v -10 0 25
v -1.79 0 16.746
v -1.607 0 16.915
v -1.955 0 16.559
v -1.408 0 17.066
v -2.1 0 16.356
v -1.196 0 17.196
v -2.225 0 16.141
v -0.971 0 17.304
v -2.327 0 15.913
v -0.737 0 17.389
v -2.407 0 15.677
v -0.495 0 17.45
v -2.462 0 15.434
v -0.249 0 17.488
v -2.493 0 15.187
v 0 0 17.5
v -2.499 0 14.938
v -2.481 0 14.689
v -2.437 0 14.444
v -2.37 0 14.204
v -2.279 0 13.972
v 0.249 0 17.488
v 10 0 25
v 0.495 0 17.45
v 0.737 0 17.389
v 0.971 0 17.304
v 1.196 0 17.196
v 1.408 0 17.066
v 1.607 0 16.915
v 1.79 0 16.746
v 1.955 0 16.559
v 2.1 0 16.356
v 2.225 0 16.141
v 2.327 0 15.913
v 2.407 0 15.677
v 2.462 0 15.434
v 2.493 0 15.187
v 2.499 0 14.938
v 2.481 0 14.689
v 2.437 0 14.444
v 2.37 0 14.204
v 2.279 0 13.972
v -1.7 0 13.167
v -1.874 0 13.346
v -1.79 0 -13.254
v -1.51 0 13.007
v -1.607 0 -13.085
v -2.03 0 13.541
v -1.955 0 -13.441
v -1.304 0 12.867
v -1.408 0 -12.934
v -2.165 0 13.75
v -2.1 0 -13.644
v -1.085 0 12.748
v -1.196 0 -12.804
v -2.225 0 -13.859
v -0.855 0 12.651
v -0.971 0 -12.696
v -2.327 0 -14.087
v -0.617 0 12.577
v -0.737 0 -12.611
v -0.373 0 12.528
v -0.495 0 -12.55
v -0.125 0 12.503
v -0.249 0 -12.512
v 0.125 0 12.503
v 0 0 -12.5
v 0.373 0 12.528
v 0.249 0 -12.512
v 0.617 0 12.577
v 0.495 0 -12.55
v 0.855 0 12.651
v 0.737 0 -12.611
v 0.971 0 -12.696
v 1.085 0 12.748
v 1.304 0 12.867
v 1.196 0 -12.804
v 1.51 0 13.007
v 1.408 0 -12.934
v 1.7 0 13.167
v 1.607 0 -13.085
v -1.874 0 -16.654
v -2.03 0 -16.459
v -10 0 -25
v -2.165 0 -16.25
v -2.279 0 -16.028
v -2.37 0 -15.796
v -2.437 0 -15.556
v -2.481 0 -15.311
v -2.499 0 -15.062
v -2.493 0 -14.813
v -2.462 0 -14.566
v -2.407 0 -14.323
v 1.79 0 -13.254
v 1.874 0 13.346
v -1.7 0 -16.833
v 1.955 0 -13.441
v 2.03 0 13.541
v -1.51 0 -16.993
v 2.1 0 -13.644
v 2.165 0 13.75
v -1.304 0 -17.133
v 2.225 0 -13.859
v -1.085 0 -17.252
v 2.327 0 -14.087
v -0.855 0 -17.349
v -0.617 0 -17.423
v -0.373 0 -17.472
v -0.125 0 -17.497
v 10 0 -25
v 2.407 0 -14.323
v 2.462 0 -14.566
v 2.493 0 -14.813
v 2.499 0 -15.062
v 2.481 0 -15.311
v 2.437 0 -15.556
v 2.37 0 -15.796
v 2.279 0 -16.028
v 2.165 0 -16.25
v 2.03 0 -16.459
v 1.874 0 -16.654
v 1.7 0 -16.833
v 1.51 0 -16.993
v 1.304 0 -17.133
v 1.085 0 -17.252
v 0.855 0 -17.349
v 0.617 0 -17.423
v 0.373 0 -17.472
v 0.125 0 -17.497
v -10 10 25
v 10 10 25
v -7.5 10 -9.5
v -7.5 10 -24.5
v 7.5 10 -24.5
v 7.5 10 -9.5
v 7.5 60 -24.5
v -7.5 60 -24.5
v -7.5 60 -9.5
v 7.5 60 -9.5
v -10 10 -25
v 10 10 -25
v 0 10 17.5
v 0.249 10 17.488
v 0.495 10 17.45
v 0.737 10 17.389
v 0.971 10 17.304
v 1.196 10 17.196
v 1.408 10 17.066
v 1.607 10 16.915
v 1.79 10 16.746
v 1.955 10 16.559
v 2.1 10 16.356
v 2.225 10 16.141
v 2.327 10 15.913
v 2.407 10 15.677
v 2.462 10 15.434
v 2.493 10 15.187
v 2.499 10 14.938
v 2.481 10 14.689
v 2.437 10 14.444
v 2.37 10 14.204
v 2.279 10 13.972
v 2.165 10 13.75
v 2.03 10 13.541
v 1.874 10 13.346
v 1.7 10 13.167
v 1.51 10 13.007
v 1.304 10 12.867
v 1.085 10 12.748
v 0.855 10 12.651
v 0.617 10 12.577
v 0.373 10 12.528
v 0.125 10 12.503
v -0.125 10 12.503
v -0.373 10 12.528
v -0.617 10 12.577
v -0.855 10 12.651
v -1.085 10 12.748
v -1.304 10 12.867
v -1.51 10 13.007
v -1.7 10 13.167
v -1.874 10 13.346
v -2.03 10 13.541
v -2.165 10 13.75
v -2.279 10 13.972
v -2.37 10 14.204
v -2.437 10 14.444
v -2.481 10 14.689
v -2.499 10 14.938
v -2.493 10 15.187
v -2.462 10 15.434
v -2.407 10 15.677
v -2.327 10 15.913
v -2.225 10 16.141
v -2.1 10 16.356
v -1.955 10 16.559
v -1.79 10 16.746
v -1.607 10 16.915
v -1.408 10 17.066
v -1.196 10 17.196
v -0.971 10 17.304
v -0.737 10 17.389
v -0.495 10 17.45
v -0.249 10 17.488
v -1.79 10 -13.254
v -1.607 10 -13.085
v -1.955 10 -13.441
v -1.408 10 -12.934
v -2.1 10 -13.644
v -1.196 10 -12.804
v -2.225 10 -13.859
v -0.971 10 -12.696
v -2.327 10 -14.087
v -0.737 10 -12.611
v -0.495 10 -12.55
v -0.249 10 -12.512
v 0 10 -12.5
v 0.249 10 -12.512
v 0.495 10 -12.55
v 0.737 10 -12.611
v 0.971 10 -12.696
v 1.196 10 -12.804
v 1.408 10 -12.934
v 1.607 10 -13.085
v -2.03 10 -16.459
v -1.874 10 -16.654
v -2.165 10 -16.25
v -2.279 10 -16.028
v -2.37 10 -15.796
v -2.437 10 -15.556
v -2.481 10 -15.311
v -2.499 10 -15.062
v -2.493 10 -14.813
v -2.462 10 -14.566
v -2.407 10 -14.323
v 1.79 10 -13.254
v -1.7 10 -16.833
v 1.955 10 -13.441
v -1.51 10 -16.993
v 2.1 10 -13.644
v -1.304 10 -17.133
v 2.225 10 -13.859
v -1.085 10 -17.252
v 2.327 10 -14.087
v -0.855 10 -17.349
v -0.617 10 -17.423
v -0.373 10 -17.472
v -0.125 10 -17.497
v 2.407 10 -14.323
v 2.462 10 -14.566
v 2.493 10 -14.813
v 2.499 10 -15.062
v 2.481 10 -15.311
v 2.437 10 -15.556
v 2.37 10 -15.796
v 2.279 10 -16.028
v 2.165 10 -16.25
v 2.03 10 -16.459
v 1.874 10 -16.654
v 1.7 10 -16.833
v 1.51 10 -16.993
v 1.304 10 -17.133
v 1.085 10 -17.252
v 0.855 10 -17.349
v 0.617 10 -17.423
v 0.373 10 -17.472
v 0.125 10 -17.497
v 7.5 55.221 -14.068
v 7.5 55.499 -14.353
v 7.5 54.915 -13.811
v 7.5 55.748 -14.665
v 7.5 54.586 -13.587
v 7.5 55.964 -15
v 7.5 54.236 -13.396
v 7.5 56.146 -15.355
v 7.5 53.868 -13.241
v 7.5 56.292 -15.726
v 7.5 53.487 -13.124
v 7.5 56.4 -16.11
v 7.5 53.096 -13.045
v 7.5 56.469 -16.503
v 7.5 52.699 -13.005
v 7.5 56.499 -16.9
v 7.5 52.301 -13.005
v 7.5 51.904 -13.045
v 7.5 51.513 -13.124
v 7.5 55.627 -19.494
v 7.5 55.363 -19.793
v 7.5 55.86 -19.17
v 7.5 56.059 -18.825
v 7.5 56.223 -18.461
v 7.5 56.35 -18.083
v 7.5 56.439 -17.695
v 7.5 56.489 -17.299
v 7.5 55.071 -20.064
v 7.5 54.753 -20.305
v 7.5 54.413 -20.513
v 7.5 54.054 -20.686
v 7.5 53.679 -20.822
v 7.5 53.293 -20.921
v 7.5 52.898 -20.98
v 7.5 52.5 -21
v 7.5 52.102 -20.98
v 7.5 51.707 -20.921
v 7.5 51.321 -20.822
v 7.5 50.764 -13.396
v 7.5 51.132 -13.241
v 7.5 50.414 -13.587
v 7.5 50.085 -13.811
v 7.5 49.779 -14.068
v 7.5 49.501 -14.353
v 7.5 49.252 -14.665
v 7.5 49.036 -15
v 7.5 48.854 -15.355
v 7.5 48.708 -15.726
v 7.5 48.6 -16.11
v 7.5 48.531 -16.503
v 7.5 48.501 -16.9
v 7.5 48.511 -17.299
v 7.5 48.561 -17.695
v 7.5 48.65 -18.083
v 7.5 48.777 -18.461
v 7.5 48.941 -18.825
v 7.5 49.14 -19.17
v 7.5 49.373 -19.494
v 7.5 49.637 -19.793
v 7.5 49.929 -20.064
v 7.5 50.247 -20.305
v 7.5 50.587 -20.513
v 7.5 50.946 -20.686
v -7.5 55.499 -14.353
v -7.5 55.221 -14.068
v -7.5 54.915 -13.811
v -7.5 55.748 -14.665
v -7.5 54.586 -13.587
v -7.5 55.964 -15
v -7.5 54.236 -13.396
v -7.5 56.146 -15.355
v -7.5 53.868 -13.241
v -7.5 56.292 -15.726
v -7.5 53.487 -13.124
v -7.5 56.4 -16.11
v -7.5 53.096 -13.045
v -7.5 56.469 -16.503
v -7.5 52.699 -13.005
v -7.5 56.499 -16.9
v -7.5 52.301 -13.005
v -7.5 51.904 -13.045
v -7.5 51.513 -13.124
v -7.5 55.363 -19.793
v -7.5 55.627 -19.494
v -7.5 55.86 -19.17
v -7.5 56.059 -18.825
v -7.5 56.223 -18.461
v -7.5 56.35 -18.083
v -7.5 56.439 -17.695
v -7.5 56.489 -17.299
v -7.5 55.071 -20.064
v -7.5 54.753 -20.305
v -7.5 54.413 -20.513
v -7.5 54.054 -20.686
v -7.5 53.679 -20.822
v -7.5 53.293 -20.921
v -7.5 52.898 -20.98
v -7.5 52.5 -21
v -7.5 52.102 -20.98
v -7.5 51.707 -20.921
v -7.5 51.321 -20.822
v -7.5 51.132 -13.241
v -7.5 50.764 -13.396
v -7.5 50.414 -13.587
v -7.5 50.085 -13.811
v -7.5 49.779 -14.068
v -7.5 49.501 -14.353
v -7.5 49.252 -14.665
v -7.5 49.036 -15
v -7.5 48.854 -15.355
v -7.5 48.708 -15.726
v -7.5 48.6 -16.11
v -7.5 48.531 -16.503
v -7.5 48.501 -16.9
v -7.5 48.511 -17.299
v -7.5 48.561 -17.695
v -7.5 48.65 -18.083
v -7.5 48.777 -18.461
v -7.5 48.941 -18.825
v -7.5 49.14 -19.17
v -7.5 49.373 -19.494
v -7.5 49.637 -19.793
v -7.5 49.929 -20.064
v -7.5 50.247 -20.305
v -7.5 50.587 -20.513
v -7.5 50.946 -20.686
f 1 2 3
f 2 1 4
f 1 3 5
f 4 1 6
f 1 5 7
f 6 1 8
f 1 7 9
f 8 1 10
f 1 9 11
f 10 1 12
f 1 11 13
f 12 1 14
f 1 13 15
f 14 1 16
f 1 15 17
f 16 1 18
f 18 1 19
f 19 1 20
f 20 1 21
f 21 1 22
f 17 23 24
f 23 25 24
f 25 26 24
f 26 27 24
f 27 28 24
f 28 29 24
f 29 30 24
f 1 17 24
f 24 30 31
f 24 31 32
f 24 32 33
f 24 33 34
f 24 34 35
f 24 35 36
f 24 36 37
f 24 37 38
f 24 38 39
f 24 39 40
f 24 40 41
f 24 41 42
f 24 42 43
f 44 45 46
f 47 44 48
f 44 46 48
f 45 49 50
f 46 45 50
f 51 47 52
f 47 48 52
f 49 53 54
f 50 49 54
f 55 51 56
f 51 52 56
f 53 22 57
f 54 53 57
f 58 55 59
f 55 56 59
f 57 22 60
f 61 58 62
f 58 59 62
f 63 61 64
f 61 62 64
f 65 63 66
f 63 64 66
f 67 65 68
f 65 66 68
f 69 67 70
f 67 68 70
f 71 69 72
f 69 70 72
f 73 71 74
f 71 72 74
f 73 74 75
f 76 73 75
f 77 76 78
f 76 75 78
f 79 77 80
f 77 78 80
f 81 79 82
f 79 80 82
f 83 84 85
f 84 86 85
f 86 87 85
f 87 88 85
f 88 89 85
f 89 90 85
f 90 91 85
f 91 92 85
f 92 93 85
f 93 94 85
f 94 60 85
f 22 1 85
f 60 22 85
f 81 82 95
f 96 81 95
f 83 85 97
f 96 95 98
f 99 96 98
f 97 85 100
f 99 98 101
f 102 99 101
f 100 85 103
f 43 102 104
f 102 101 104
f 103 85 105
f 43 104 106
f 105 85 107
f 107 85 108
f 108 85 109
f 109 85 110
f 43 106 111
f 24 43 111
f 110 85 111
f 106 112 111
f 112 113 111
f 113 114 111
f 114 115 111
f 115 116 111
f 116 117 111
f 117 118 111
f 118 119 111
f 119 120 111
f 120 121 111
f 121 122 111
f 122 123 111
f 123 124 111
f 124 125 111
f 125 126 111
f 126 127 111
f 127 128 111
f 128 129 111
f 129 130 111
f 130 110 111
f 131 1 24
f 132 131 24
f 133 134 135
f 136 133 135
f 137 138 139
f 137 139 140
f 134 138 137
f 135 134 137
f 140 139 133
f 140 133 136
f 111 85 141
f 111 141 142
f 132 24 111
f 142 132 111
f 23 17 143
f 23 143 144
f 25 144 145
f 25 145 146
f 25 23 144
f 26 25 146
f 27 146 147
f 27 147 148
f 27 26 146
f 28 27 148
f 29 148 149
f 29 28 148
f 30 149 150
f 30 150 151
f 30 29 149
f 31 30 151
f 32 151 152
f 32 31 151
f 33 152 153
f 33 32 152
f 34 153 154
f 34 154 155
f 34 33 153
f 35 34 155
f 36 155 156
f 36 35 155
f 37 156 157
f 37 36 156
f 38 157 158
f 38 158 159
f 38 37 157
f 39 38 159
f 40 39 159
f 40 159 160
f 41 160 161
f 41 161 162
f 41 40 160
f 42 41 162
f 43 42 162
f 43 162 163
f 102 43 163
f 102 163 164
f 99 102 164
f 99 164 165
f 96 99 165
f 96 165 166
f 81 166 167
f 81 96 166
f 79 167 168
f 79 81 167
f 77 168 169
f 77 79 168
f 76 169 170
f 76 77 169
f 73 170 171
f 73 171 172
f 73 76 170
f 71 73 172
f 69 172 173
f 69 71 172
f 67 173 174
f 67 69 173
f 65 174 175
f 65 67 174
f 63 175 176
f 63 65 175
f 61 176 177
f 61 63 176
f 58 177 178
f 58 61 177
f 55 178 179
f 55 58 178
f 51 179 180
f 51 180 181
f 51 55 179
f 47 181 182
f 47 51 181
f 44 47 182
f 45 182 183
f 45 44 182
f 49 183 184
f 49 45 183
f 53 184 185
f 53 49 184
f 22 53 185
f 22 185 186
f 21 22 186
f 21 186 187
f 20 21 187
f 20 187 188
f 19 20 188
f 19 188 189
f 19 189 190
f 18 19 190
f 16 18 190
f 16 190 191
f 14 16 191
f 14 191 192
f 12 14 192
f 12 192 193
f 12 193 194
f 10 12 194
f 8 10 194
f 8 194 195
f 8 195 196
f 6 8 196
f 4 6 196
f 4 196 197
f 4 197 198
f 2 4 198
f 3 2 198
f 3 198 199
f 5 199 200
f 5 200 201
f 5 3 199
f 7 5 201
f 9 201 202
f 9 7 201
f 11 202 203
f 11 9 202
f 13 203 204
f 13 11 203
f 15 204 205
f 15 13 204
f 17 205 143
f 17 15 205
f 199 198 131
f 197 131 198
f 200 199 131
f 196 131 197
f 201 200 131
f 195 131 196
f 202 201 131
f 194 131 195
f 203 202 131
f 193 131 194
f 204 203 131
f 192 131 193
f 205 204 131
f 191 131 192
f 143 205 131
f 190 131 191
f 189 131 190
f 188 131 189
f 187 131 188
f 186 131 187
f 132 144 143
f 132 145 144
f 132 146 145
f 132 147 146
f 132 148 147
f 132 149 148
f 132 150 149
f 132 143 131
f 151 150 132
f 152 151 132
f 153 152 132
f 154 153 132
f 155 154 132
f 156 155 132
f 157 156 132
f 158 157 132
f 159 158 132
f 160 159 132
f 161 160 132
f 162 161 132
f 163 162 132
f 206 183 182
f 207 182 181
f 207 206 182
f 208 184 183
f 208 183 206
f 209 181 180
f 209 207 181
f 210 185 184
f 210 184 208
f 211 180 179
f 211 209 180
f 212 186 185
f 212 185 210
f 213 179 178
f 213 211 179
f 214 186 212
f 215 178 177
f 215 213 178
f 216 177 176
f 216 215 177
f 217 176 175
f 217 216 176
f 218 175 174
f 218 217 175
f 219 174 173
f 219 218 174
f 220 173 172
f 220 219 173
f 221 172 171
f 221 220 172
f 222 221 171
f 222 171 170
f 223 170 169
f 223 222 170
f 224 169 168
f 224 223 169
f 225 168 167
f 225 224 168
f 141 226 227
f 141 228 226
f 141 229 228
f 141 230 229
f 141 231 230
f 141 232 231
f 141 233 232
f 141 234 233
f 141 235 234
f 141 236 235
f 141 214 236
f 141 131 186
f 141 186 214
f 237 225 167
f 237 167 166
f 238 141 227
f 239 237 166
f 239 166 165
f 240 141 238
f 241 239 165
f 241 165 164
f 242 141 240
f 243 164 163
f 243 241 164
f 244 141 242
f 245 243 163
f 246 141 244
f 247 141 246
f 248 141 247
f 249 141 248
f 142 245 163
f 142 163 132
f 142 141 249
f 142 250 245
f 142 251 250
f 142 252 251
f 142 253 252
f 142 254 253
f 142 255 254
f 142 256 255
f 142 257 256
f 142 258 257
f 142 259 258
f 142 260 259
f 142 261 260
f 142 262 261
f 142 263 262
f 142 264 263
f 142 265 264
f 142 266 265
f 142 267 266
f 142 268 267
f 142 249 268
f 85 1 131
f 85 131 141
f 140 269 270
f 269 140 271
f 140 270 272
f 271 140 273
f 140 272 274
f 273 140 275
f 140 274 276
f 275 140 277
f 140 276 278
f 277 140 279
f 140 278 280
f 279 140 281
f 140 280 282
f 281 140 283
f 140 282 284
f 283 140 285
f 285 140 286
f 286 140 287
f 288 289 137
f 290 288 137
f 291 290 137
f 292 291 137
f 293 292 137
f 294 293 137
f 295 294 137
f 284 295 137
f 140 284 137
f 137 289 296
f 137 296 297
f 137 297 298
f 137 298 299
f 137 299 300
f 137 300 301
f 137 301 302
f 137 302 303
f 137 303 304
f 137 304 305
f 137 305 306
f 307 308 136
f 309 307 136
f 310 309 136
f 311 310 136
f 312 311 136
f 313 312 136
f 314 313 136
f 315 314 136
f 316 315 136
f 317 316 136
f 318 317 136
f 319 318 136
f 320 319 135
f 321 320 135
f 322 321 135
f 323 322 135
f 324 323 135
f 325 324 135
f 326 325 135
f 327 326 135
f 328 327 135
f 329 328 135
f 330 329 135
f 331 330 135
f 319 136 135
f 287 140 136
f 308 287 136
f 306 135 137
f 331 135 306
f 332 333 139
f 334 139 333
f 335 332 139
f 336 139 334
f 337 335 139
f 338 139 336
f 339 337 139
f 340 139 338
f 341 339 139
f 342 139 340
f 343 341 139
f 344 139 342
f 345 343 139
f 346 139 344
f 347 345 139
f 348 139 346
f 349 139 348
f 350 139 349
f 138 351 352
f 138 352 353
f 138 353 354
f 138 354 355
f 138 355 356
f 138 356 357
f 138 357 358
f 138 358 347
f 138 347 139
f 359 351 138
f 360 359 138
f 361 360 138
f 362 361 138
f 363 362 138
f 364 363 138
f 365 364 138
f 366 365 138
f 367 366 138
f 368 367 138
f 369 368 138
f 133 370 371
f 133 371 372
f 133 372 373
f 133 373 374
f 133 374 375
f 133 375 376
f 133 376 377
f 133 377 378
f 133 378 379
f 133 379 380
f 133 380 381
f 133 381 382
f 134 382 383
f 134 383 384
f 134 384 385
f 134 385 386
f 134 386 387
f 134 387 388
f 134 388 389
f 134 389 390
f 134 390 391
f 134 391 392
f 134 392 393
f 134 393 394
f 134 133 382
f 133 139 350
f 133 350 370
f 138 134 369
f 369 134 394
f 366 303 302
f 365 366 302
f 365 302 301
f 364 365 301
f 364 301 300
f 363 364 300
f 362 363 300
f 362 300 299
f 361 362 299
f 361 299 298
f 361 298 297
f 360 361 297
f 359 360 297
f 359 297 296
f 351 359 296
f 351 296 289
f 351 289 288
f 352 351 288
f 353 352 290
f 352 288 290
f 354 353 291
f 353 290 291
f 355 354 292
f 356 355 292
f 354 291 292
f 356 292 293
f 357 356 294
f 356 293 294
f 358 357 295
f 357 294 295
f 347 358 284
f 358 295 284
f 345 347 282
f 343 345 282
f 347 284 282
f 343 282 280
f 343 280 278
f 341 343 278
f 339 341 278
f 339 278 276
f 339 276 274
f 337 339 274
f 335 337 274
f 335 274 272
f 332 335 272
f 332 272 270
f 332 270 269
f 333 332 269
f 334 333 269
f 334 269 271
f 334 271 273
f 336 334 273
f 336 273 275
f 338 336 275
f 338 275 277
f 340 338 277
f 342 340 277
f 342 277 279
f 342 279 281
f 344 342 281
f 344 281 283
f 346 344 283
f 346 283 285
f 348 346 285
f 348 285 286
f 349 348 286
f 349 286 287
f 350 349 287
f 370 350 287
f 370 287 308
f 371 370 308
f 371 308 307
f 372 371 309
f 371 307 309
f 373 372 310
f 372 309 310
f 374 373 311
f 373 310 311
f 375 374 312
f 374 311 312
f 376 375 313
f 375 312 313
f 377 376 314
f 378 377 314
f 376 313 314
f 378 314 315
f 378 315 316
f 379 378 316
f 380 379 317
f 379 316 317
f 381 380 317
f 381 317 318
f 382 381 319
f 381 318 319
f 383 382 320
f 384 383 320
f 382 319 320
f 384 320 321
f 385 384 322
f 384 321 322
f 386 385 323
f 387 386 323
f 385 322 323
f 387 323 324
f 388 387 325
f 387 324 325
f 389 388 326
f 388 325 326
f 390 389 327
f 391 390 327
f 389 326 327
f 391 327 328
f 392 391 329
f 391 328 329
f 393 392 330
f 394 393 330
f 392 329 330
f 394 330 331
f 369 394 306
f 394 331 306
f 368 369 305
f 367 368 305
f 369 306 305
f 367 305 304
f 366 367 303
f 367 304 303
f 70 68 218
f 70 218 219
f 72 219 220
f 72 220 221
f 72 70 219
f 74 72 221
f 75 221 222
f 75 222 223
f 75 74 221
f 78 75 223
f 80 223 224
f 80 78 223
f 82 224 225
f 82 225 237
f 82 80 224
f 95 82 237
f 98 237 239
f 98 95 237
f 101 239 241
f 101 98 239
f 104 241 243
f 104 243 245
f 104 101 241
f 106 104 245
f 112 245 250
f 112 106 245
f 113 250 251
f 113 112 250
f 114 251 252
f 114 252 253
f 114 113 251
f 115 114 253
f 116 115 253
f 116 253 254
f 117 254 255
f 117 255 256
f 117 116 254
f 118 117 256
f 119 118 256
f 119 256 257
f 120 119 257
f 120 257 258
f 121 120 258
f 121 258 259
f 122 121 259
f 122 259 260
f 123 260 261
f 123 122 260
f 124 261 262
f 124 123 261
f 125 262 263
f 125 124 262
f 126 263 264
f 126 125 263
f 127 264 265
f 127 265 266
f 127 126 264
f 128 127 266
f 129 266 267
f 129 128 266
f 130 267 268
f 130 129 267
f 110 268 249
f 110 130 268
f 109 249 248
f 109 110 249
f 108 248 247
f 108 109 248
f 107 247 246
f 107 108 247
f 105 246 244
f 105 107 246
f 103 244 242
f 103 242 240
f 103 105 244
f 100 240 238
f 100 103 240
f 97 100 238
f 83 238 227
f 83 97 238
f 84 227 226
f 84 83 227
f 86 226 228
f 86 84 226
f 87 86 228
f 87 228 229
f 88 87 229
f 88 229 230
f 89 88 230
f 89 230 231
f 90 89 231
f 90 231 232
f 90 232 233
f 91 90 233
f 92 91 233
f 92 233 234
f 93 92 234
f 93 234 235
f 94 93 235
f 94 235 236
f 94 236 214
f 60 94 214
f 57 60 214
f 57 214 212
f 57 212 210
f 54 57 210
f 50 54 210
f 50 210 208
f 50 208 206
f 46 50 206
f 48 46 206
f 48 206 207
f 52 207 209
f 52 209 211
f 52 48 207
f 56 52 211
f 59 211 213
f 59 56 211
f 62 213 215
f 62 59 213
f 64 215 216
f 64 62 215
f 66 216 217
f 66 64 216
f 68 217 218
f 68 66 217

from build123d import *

# Parameters (mm, degrees)
ESQUISSE1_W             = 20
ESQUISSE1_H             = 50
ESQUISSE1_R             = 2.5
BOSS_EXTRU_1_DEPTH      = 10
ESQUISSE2_W             = 15
ESQUISSE2_H             = 15
BOSS_EXTRU_2_DEPTH      = 50
ESQUISSE3_R             = 4
ENL_V_MAT_EXTRU_1_DEPTH = 68.314560089


with BuildPart() as part:
    # Esquisse1 → Boss.-Extru.1 (new body)
    with BuildSketch(Plane(origin=(0, 0, 0), x_dir=(1, 0, 0), z_dir=(0, 1, 0))):
        Rectangle(ESQUISSE1_W, ESQUISSE1_H)
        with Locations(Location((0, -15, 0), (0, 0, 270))):
            Circle(ESQUISSE1_R, mode=Mode.SUBTRACT)
        with Locations(Location((0, 15, 0), (0, 0, 270))):
            Circle(ESQUISSE1_R, mode=Mode.SUBTRACT)
    extrude(amount=BOSS_EXTRU_1_DEPTH)


with BuildPart() as body_2:
    # Esquisse2 → Boss.-Extru.2 (new body)
    with BuildSketch(Plane(origin=(0, 10, 0), x_dir=(1, 0, 0), z_dir=(0, 1, 0))):
        with Locations((0, 17)):
            Rectangle(ESQUISSE2_W, ESQUISSE2_H)
    extrude(amount=BOSS_EXTRU_2_DEPTH)

    # Esquisse3 → Enlèv. mat.-Extru.1 (cut, through all)
    with BuildSketch(Plane(origin=(7.5, 0, 0), x_dir=(0, 0, -1), z_dir=(1, 0, 0))):
        with Locations((17, 52.5)):
            Circle(ESQUISSE3_R)
    extrude(amount=-ENL_V_MAT_EXTRU_1_DEPTH, mode=Mode.SUBTRACT)


solid = Compound([part.part, body_2.part])
